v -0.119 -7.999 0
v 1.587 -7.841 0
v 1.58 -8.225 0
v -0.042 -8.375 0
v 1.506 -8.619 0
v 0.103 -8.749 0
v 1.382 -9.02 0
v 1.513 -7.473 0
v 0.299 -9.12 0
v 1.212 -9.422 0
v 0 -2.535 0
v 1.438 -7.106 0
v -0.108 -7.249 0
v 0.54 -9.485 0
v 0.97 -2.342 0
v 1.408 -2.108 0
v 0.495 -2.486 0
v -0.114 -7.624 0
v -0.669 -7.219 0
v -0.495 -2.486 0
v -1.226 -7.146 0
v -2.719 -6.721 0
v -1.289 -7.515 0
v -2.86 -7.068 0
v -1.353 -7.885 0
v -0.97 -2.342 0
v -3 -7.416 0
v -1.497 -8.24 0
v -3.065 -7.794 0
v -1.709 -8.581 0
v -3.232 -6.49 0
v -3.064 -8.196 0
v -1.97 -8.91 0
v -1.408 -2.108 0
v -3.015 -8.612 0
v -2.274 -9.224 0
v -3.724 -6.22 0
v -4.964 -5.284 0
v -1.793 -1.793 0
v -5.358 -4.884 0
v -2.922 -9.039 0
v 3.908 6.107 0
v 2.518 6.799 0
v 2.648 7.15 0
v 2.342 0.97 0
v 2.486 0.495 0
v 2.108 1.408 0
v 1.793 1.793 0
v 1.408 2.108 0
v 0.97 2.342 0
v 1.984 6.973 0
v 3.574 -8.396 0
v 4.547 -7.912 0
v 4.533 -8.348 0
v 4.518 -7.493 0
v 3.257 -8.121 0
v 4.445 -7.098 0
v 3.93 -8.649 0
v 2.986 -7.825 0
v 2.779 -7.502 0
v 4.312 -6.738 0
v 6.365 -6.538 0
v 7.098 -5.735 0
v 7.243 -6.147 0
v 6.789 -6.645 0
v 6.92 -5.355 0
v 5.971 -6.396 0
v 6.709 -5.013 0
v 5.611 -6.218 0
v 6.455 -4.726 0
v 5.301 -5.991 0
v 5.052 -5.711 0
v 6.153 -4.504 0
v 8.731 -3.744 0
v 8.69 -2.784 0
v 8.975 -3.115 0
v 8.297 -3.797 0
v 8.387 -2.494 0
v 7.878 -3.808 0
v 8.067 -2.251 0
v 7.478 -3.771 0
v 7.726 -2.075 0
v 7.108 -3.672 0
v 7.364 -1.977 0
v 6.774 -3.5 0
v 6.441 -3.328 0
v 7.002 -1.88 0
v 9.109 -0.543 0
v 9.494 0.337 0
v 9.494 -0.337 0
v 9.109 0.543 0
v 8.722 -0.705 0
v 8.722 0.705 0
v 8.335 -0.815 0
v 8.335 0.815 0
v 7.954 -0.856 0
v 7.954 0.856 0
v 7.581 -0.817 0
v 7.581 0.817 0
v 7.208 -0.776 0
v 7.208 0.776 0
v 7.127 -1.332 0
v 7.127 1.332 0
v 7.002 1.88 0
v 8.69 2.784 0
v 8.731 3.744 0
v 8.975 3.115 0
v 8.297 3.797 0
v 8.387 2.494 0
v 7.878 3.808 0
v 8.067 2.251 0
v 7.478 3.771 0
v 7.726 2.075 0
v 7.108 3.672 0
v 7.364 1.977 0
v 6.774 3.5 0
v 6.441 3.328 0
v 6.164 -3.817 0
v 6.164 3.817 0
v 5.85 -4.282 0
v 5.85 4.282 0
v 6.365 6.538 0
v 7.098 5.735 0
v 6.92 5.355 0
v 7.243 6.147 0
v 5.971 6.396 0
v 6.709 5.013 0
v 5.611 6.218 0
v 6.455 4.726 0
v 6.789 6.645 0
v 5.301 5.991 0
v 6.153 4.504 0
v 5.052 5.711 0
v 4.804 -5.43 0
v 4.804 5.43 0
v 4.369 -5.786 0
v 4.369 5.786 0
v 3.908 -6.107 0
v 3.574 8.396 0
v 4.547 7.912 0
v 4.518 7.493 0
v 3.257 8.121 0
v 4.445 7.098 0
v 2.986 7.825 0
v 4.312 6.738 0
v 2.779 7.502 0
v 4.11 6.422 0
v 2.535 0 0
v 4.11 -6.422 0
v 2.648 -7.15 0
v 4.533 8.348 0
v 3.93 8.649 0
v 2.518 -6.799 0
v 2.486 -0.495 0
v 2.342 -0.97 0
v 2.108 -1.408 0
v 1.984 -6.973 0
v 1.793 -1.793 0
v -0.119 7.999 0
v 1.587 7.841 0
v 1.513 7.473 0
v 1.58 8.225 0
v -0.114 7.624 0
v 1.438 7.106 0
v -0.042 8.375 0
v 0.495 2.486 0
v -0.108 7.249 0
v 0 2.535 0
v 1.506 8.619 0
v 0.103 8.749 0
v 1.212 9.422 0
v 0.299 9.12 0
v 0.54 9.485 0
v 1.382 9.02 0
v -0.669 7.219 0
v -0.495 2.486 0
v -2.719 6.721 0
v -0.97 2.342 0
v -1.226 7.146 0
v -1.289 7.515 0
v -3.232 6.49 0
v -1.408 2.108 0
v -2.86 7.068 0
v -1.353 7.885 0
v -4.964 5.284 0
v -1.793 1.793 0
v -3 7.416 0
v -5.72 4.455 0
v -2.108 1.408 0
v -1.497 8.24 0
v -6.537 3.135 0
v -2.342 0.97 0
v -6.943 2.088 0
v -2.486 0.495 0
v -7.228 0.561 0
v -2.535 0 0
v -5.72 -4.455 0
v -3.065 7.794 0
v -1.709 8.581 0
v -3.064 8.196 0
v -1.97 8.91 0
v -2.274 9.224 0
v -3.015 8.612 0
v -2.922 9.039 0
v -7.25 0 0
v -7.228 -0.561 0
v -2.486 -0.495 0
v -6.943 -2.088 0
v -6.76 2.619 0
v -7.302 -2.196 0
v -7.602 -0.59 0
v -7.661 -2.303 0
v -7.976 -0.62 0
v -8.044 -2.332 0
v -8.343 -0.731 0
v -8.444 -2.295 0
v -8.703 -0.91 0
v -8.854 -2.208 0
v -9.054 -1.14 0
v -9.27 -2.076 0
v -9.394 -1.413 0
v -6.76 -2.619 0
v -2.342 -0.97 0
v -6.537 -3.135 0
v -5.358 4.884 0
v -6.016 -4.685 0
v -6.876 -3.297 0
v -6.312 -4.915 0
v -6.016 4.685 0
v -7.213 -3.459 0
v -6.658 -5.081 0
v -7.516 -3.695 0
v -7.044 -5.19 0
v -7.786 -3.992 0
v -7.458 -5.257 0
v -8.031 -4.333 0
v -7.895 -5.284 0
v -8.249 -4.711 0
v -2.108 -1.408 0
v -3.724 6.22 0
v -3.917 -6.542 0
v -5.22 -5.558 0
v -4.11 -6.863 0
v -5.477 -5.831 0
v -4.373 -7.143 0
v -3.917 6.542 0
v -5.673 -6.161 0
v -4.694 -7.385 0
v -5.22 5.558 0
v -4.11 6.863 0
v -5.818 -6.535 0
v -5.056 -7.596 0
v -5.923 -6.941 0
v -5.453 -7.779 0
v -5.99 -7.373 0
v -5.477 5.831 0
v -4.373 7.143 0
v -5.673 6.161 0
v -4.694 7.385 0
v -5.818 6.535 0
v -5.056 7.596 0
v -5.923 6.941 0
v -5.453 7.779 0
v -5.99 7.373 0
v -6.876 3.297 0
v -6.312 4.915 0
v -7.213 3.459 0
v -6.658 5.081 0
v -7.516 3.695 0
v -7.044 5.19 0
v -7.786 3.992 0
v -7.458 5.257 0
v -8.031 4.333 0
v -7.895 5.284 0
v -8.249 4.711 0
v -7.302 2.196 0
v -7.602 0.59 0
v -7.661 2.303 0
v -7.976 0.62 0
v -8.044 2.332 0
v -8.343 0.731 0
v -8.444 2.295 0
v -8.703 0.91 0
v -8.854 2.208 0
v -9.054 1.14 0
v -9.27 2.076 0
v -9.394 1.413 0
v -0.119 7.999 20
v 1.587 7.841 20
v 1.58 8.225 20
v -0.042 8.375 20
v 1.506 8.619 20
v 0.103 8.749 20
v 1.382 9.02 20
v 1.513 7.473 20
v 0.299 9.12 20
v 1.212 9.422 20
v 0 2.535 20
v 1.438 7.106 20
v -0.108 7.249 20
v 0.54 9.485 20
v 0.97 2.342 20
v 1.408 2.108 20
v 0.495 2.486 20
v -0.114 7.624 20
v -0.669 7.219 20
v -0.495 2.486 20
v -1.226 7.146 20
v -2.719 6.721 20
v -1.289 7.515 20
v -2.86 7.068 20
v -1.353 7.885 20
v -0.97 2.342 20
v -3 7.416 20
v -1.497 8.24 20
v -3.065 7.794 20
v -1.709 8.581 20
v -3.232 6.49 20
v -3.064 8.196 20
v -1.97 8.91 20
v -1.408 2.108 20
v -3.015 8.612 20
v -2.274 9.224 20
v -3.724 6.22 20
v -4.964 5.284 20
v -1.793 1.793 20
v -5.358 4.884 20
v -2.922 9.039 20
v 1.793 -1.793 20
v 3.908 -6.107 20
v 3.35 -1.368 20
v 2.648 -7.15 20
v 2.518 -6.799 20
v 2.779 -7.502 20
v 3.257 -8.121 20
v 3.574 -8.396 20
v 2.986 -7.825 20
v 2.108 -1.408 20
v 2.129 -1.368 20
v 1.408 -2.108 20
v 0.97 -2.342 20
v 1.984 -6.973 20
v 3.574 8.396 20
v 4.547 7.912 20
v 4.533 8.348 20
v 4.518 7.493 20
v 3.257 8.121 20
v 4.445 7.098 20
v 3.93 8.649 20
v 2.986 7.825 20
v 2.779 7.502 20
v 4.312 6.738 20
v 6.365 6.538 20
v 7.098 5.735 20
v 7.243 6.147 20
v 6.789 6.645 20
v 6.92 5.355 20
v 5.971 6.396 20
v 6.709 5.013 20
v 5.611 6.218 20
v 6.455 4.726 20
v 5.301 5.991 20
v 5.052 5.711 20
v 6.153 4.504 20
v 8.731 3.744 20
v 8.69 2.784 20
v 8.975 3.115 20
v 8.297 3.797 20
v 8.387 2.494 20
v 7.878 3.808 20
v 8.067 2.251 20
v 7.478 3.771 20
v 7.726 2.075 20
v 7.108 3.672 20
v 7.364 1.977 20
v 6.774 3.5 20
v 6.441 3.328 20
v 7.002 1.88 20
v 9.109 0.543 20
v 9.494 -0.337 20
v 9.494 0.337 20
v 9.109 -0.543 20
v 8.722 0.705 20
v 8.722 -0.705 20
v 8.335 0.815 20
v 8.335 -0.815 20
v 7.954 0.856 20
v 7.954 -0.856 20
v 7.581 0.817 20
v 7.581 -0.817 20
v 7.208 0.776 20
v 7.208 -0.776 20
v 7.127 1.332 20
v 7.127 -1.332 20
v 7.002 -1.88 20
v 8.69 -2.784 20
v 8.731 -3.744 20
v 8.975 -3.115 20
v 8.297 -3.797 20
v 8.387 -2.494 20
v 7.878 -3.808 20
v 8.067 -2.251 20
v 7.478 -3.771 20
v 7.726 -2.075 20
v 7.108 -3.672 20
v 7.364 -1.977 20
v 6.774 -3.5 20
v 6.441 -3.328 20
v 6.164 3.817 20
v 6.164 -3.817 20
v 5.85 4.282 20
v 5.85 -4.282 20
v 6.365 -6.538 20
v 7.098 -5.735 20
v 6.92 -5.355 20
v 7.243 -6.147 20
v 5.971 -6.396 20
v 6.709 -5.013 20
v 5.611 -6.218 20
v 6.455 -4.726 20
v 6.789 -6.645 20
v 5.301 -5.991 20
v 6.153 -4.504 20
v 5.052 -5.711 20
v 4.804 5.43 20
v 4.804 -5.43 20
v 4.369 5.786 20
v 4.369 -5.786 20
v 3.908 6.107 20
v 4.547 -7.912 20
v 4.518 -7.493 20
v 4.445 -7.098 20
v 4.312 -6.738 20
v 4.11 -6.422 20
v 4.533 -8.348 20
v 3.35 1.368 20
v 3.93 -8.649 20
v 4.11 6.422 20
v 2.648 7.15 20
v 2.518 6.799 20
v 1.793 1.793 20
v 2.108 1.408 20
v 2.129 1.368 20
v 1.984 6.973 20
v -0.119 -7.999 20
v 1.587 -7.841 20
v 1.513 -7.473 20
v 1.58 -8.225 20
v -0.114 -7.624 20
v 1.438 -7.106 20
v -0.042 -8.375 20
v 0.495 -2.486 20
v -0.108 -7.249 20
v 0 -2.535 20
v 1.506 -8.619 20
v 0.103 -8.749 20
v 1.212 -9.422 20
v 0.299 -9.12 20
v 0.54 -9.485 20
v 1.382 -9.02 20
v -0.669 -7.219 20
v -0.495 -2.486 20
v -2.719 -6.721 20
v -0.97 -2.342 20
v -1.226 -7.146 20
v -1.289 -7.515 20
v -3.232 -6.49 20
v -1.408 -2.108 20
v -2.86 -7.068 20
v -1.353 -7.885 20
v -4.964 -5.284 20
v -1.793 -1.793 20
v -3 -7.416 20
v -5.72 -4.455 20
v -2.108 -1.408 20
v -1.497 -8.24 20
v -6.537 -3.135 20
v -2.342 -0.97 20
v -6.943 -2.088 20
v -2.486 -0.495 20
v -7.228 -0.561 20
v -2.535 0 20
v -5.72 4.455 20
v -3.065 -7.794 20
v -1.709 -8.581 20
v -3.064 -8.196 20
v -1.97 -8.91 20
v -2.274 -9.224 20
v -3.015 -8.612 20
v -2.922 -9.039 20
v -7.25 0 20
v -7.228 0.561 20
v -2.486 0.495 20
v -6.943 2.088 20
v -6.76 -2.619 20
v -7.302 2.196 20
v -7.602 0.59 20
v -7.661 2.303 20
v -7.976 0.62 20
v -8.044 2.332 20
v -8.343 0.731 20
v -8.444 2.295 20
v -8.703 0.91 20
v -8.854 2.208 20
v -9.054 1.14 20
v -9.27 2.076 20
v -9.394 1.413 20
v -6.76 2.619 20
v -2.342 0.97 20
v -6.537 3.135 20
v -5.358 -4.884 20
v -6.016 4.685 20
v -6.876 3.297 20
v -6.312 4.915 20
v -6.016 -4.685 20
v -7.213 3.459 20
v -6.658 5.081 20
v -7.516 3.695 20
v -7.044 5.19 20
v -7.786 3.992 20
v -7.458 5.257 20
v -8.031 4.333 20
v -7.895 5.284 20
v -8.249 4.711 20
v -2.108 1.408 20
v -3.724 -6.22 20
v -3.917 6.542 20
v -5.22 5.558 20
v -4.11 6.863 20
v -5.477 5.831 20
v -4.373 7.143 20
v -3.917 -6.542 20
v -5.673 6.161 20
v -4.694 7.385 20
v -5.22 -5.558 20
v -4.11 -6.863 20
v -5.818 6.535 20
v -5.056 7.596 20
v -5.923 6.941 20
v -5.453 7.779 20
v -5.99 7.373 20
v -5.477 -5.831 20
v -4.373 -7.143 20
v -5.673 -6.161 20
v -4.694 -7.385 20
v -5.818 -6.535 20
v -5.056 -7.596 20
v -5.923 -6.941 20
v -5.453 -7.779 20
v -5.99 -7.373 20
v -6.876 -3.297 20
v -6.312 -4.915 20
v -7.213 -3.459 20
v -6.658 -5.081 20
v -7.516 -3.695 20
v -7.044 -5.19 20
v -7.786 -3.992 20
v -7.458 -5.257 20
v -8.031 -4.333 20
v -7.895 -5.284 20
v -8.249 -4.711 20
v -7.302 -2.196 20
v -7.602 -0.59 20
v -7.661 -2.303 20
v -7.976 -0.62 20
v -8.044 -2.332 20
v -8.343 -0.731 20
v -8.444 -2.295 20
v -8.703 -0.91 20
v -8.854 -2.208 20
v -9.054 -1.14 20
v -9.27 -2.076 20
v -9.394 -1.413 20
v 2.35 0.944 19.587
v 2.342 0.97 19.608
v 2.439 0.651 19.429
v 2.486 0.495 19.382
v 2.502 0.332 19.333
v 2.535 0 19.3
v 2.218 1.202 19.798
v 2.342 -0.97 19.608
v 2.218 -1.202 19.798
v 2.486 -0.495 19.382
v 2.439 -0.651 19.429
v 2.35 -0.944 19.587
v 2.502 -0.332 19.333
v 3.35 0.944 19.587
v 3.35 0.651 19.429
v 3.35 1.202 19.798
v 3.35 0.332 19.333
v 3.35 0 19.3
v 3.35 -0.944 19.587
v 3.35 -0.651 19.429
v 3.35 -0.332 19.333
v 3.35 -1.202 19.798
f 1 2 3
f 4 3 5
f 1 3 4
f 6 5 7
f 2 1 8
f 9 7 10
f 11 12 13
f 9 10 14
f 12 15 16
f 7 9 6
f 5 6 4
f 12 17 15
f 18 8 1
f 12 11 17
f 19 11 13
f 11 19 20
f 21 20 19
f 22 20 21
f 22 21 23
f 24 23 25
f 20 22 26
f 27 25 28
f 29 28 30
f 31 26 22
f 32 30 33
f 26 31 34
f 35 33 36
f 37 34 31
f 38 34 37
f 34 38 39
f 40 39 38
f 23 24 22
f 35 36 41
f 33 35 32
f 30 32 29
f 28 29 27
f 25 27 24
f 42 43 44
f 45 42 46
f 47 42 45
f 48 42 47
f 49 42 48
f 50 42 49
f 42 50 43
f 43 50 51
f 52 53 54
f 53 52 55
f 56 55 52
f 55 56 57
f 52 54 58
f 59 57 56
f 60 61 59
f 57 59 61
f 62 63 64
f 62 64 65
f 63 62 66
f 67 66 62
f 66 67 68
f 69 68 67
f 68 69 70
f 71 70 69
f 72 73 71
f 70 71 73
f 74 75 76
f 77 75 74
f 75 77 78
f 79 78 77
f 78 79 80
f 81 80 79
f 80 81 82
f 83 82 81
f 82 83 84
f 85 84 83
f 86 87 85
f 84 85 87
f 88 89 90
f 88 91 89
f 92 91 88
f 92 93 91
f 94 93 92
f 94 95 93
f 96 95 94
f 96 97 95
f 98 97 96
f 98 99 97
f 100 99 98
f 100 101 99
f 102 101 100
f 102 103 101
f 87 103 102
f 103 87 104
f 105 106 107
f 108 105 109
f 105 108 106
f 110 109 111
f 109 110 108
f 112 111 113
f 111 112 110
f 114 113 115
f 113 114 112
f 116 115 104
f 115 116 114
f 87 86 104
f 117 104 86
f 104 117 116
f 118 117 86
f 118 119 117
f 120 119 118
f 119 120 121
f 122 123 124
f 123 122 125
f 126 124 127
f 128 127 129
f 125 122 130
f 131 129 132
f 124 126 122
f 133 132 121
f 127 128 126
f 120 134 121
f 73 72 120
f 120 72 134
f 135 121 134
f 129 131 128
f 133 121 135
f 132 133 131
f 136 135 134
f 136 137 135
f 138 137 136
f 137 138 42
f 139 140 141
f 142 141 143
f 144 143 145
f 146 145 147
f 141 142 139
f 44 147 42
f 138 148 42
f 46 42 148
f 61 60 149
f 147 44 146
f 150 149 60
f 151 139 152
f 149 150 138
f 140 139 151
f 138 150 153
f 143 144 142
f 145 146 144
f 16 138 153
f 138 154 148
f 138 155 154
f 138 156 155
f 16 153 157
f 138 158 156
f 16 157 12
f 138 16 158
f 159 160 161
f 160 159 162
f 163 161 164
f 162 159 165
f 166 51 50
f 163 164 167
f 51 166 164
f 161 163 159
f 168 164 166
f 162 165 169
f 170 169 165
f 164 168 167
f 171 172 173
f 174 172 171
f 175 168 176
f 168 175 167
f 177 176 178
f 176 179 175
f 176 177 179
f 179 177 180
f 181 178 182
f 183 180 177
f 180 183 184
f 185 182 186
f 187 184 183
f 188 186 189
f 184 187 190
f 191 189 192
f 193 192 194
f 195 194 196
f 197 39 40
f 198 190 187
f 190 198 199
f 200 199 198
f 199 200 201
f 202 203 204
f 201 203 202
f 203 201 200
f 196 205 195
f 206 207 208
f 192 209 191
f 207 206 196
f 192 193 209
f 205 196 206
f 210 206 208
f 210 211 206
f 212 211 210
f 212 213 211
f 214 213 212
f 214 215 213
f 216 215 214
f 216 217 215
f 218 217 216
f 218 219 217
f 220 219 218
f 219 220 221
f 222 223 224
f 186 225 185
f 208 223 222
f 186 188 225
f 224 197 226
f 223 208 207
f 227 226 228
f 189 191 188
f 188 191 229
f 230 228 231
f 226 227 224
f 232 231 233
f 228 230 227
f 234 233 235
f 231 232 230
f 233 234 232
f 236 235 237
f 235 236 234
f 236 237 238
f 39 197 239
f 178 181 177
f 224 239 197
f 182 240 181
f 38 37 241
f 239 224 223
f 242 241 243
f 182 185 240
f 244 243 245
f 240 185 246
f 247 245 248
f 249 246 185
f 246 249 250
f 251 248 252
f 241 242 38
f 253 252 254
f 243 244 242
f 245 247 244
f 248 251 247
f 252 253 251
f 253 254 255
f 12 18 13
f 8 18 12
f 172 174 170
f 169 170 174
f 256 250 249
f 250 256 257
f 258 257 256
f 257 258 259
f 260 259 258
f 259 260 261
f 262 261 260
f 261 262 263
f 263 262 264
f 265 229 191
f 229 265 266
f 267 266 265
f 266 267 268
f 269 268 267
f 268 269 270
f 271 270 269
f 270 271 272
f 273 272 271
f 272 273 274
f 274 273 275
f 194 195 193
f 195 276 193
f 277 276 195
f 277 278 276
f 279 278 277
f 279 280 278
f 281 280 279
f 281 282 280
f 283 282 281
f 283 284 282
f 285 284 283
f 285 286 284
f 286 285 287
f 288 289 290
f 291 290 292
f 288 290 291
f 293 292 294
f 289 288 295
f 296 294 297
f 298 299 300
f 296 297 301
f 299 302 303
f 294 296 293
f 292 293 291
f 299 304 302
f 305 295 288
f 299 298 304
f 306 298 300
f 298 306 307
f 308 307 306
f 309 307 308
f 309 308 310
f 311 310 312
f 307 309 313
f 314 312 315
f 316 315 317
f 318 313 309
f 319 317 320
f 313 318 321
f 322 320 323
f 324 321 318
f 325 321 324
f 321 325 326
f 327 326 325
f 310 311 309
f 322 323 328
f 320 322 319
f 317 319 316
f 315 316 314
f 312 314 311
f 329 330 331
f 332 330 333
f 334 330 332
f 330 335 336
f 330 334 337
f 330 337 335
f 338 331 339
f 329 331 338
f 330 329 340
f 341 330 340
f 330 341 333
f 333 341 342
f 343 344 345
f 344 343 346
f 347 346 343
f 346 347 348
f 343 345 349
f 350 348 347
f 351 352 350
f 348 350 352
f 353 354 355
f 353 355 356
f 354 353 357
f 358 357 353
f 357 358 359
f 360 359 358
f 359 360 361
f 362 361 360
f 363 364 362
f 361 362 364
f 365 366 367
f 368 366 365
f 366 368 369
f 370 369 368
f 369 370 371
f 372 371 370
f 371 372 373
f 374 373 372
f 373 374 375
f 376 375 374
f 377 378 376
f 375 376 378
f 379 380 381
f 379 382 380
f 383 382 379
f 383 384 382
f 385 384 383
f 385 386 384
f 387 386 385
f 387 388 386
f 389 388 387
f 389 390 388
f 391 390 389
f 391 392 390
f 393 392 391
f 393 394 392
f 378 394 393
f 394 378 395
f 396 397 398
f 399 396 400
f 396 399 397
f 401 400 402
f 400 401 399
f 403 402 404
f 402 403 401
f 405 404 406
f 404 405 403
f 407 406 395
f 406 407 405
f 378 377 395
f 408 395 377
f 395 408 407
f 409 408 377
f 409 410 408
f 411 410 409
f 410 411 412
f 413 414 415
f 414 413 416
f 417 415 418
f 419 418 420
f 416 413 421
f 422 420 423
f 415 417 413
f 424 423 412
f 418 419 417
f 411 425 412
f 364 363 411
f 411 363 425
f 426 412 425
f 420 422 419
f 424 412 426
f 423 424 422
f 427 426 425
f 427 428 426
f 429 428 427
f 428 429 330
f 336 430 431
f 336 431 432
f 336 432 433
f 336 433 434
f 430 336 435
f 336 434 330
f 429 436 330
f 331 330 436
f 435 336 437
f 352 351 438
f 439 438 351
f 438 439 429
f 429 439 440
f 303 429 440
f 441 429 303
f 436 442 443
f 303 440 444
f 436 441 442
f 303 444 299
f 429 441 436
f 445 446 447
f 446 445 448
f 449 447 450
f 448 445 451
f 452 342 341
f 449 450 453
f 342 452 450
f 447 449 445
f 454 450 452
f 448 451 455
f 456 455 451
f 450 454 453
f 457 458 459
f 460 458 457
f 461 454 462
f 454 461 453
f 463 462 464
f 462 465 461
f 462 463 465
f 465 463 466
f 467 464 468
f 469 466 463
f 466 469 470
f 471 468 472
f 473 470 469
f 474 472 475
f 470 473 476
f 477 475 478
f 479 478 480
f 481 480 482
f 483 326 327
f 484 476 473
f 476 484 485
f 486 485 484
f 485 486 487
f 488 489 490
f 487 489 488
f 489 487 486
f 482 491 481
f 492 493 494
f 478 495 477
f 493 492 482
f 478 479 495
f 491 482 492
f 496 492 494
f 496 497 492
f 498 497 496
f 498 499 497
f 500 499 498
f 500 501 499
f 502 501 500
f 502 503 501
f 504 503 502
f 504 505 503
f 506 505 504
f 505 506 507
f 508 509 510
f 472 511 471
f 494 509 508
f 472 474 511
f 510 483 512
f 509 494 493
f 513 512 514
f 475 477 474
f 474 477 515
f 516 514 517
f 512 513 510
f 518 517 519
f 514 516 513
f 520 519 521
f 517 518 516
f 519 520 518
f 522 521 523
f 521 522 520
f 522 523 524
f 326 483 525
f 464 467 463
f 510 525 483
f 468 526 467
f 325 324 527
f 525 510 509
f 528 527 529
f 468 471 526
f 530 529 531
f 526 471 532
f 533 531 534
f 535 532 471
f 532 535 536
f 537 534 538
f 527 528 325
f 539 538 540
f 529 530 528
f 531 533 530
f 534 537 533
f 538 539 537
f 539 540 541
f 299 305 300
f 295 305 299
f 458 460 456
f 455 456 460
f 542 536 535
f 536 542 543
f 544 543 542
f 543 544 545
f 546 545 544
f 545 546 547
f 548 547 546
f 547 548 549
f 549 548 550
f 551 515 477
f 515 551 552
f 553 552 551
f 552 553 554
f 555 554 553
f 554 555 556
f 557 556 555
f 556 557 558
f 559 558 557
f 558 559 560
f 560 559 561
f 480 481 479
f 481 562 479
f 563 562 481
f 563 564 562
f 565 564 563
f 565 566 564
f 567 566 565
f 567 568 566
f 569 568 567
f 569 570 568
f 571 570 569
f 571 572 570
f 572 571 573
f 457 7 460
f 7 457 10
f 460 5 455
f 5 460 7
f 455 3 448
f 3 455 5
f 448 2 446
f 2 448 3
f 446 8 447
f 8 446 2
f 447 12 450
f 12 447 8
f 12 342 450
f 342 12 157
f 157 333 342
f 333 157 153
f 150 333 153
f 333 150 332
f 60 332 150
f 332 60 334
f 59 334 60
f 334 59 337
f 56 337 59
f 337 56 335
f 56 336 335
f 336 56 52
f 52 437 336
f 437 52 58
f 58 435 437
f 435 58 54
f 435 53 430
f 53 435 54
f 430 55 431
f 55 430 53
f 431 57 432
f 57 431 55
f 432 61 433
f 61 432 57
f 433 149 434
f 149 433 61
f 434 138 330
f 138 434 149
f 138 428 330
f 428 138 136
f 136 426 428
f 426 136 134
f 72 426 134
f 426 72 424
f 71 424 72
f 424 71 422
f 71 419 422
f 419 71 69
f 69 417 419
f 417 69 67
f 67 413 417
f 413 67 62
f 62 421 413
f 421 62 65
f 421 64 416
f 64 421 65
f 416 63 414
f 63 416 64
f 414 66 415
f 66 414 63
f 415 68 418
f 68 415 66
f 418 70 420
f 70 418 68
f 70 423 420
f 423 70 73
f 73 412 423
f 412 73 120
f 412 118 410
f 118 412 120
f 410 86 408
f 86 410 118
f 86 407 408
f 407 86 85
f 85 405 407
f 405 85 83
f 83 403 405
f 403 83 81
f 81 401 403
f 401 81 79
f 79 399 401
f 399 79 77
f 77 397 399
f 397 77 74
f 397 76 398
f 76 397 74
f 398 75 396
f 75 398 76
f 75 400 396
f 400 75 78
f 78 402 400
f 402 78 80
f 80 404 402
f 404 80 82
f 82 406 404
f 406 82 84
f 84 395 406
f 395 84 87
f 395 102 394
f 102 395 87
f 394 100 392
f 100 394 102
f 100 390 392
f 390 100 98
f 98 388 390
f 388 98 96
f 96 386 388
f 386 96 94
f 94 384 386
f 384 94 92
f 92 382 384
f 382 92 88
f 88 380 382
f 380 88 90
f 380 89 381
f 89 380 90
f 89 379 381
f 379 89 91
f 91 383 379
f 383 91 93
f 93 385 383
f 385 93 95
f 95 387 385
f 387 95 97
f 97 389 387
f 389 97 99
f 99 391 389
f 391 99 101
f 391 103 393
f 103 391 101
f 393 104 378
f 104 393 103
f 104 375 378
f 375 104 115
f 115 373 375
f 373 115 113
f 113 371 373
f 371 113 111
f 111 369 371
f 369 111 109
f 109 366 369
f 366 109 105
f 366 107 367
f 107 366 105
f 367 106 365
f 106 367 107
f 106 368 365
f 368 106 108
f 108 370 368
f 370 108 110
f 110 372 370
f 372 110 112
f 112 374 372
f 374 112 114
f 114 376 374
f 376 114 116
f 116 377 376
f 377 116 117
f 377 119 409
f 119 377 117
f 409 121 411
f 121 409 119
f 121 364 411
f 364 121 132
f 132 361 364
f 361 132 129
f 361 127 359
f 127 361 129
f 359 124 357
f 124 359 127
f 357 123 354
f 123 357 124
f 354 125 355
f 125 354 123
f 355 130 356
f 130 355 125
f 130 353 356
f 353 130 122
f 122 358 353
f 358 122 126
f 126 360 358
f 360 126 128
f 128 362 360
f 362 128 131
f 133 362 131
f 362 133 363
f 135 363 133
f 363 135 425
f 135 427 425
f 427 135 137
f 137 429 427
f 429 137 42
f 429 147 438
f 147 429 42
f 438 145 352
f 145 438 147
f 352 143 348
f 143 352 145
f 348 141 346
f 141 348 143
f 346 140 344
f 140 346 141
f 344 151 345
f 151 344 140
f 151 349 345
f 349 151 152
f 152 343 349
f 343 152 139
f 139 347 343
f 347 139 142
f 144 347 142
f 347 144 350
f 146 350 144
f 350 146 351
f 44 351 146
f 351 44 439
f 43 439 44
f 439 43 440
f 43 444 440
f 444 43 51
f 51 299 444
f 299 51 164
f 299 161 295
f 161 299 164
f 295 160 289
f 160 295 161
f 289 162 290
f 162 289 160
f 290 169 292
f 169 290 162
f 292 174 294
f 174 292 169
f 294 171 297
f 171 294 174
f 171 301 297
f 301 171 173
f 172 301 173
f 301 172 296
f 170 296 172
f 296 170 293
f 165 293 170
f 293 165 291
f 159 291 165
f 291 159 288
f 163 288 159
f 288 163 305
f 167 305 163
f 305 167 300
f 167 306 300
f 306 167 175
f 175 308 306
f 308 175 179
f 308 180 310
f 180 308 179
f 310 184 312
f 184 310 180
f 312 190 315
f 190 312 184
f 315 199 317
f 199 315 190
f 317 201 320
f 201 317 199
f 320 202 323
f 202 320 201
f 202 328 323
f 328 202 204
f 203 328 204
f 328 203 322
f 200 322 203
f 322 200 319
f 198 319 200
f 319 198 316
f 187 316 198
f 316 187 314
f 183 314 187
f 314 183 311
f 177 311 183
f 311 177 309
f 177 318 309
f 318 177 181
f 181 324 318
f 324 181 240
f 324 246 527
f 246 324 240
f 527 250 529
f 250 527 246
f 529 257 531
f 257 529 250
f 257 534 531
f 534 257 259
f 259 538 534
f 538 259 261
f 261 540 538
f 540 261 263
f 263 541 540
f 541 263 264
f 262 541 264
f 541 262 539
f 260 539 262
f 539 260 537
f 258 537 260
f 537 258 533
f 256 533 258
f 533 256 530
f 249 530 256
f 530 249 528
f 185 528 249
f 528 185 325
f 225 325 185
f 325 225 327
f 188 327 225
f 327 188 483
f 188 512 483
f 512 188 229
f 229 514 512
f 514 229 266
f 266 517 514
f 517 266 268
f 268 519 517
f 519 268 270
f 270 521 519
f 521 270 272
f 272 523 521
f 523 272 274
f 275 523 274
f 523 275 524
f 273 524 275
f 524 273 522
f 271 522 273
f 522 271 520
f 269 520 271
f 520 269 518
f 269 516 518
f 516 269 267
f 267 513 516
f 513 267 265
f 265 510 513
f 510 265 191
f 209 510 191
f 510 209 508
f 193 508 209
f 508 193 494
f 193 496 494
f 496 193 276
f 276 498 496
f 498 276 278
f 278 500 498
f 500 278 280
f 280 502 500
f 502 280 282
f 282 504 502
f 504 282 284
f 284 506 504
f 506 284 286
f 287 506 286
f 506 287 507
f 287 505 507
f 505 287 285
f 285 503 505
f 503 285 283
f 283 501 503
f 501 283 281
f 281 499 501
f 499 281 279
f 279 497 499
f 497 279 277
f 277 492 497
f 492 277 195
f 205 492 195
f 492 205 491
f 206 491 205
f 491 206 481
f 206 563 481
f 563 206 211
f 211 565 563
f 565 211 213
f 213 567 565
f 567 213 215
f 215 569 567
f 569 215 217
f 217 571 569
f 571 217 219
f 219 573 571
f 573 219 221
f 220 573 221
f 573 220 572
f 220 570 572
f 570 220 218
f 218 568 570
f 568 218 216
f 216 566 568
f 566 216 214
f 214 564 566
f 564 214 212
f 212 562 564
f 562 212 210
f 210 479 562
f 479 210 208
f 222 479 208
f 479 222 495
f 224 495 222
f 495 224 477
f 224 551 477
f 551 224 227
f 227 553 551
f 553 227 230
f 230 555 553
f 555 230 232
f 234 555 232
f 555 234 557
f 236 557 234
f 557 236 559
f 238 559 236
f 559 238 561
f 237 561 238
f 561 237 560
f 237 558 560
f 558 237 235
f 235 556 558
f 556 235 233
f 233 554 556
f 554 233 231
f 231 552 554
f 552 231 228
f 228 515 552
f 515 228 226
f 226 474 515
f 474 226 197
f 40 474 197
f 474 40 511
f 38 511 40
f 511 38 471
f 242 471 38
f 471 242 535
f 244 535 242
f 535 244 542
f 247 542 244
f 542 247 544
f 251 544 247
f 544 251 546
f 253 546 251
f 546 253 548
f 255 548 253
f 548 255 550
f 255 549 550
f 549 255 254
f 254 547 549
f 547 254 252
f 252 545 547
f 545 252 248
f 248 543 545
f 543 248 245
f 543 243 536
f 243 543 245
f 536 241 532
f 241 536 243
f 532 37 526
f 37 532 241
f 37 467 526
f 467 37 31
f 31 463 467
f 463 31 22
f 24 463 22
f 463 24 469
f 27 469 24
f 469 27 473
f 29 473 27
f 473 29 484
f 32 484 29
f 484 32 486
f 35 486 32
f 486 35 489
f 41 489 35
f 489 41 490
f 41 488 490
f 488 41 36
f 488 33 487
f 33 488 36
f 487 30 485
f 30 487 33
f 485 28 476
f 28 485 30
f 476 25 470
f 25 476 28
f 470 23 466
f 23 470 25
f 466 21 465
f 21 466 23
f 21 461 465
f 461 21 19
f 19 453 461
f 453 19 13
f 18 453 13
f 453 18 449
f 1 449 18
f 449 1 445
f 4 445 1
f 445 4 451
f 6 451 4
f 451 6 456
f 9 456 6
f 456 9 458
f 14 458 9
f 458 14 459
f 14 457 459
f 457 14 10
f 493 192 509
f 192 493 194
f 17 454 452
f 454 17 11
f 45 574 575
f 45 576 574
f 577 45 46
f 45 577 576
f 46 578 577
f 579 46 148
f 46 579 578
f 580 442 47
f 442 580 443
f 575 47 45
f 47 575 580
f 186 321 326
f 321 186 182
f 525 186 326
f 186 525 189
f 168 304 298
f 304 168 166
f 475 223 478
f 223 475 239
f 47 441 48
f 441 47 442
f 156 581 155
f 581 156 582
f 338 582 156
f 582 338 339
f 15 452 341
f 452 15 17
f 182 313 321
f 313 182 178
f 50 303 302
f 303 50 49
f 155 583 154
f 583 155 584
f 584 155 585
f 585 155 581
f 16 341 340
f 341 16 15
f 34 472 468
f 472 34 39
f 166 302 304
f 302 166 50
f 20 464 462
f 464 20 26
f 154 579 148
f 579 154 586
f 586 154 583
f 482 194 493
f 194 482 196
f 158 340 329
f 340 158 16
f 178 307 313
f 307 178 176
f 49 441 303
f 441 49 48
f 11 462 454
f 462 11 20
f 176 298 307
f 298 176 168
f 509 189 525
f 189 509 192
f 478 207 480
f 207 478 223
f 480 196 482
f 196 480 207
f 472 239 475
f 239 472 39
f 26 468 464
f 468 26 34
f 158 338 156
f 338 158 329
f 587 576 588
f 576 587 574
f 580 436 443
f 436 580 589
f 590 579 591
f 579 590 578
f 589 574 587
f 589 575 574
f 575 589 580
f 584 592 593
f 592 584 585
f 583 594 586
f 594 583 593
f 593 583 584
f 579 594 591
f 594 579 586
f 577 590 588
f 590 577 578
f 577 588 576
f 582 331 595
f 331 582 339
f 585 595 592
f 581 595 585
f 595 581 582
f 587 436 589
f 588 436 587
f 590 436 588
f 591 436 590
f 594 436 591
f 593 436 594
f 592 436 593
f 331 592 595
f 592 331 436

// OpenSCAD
$fn = 32;

// ----------------------------------------------------------------------
// Spur gear: m=1 z=17, 19 mm tip diameter x 20 mm
// ----------------------------------------------------------------------

// --- parameters (mm) ---
module_m = 1;             // module
teeth = 17;               // number of teeth
face_w = 20;              // face width
pa = 20;                  // pressure angle, deg
bore_d = 5.07;            // shaft bore
set_d = 3.4;              // set screw tap hole
set_z = 21;               // set screw height

/* --- involute profile --- */
pitch_r = module_m * teeth / 2;
base_r = pitch_r * cos(pa);
tip_r = pitch_r + module_m;
root_r = pitch_r - 1.25 * module_m;
flank_steps = 6;

function inv_deg(a) = (tan(a) - a * PI / 180) * 180 / PI;
function flank_r(i) = root_r + (tip_r - root_r) * i / flank_steps;
function half_angle(r) = 90 / teeth + inv_deg(pa) - inv_deg(acos(min(1, base_r / r)));
function tooth_pt(k, i, side) =
    let (r = flank_r(i), a = k * 360 / teeth + side * half_angle(r))
    [r * cos(a), r * sin(a)];

module tooth_profile() {
  polygon(points = [
    for (k = [0 : teeth - 1])
      each [
        for (i = [0 : flank_steps]) tooth_pt(k, i, -1),
        for (i = [flank_steps : -1 : 0]) tooth_pt(k, i, 1),
        let (ta = (k + 0.5) * 360 / teeth)
          [root_r * cos(ta), root_r * sin(ta)]
      ]
  ]);
}

module gear_disc() {
  linear_extrude(height = face_w) tooth_profile();
}

difference() {
  gear_disc();
  translate([0, 0, -1]) cylinder(h = face_w + 3, d = bore_d);
  /* set screw, drilled radially */
  translate([-1, 0, set_z]) rotate([0, 90, 0]) cylinder(h = (root_r * 0.6), d = set_d);
}
